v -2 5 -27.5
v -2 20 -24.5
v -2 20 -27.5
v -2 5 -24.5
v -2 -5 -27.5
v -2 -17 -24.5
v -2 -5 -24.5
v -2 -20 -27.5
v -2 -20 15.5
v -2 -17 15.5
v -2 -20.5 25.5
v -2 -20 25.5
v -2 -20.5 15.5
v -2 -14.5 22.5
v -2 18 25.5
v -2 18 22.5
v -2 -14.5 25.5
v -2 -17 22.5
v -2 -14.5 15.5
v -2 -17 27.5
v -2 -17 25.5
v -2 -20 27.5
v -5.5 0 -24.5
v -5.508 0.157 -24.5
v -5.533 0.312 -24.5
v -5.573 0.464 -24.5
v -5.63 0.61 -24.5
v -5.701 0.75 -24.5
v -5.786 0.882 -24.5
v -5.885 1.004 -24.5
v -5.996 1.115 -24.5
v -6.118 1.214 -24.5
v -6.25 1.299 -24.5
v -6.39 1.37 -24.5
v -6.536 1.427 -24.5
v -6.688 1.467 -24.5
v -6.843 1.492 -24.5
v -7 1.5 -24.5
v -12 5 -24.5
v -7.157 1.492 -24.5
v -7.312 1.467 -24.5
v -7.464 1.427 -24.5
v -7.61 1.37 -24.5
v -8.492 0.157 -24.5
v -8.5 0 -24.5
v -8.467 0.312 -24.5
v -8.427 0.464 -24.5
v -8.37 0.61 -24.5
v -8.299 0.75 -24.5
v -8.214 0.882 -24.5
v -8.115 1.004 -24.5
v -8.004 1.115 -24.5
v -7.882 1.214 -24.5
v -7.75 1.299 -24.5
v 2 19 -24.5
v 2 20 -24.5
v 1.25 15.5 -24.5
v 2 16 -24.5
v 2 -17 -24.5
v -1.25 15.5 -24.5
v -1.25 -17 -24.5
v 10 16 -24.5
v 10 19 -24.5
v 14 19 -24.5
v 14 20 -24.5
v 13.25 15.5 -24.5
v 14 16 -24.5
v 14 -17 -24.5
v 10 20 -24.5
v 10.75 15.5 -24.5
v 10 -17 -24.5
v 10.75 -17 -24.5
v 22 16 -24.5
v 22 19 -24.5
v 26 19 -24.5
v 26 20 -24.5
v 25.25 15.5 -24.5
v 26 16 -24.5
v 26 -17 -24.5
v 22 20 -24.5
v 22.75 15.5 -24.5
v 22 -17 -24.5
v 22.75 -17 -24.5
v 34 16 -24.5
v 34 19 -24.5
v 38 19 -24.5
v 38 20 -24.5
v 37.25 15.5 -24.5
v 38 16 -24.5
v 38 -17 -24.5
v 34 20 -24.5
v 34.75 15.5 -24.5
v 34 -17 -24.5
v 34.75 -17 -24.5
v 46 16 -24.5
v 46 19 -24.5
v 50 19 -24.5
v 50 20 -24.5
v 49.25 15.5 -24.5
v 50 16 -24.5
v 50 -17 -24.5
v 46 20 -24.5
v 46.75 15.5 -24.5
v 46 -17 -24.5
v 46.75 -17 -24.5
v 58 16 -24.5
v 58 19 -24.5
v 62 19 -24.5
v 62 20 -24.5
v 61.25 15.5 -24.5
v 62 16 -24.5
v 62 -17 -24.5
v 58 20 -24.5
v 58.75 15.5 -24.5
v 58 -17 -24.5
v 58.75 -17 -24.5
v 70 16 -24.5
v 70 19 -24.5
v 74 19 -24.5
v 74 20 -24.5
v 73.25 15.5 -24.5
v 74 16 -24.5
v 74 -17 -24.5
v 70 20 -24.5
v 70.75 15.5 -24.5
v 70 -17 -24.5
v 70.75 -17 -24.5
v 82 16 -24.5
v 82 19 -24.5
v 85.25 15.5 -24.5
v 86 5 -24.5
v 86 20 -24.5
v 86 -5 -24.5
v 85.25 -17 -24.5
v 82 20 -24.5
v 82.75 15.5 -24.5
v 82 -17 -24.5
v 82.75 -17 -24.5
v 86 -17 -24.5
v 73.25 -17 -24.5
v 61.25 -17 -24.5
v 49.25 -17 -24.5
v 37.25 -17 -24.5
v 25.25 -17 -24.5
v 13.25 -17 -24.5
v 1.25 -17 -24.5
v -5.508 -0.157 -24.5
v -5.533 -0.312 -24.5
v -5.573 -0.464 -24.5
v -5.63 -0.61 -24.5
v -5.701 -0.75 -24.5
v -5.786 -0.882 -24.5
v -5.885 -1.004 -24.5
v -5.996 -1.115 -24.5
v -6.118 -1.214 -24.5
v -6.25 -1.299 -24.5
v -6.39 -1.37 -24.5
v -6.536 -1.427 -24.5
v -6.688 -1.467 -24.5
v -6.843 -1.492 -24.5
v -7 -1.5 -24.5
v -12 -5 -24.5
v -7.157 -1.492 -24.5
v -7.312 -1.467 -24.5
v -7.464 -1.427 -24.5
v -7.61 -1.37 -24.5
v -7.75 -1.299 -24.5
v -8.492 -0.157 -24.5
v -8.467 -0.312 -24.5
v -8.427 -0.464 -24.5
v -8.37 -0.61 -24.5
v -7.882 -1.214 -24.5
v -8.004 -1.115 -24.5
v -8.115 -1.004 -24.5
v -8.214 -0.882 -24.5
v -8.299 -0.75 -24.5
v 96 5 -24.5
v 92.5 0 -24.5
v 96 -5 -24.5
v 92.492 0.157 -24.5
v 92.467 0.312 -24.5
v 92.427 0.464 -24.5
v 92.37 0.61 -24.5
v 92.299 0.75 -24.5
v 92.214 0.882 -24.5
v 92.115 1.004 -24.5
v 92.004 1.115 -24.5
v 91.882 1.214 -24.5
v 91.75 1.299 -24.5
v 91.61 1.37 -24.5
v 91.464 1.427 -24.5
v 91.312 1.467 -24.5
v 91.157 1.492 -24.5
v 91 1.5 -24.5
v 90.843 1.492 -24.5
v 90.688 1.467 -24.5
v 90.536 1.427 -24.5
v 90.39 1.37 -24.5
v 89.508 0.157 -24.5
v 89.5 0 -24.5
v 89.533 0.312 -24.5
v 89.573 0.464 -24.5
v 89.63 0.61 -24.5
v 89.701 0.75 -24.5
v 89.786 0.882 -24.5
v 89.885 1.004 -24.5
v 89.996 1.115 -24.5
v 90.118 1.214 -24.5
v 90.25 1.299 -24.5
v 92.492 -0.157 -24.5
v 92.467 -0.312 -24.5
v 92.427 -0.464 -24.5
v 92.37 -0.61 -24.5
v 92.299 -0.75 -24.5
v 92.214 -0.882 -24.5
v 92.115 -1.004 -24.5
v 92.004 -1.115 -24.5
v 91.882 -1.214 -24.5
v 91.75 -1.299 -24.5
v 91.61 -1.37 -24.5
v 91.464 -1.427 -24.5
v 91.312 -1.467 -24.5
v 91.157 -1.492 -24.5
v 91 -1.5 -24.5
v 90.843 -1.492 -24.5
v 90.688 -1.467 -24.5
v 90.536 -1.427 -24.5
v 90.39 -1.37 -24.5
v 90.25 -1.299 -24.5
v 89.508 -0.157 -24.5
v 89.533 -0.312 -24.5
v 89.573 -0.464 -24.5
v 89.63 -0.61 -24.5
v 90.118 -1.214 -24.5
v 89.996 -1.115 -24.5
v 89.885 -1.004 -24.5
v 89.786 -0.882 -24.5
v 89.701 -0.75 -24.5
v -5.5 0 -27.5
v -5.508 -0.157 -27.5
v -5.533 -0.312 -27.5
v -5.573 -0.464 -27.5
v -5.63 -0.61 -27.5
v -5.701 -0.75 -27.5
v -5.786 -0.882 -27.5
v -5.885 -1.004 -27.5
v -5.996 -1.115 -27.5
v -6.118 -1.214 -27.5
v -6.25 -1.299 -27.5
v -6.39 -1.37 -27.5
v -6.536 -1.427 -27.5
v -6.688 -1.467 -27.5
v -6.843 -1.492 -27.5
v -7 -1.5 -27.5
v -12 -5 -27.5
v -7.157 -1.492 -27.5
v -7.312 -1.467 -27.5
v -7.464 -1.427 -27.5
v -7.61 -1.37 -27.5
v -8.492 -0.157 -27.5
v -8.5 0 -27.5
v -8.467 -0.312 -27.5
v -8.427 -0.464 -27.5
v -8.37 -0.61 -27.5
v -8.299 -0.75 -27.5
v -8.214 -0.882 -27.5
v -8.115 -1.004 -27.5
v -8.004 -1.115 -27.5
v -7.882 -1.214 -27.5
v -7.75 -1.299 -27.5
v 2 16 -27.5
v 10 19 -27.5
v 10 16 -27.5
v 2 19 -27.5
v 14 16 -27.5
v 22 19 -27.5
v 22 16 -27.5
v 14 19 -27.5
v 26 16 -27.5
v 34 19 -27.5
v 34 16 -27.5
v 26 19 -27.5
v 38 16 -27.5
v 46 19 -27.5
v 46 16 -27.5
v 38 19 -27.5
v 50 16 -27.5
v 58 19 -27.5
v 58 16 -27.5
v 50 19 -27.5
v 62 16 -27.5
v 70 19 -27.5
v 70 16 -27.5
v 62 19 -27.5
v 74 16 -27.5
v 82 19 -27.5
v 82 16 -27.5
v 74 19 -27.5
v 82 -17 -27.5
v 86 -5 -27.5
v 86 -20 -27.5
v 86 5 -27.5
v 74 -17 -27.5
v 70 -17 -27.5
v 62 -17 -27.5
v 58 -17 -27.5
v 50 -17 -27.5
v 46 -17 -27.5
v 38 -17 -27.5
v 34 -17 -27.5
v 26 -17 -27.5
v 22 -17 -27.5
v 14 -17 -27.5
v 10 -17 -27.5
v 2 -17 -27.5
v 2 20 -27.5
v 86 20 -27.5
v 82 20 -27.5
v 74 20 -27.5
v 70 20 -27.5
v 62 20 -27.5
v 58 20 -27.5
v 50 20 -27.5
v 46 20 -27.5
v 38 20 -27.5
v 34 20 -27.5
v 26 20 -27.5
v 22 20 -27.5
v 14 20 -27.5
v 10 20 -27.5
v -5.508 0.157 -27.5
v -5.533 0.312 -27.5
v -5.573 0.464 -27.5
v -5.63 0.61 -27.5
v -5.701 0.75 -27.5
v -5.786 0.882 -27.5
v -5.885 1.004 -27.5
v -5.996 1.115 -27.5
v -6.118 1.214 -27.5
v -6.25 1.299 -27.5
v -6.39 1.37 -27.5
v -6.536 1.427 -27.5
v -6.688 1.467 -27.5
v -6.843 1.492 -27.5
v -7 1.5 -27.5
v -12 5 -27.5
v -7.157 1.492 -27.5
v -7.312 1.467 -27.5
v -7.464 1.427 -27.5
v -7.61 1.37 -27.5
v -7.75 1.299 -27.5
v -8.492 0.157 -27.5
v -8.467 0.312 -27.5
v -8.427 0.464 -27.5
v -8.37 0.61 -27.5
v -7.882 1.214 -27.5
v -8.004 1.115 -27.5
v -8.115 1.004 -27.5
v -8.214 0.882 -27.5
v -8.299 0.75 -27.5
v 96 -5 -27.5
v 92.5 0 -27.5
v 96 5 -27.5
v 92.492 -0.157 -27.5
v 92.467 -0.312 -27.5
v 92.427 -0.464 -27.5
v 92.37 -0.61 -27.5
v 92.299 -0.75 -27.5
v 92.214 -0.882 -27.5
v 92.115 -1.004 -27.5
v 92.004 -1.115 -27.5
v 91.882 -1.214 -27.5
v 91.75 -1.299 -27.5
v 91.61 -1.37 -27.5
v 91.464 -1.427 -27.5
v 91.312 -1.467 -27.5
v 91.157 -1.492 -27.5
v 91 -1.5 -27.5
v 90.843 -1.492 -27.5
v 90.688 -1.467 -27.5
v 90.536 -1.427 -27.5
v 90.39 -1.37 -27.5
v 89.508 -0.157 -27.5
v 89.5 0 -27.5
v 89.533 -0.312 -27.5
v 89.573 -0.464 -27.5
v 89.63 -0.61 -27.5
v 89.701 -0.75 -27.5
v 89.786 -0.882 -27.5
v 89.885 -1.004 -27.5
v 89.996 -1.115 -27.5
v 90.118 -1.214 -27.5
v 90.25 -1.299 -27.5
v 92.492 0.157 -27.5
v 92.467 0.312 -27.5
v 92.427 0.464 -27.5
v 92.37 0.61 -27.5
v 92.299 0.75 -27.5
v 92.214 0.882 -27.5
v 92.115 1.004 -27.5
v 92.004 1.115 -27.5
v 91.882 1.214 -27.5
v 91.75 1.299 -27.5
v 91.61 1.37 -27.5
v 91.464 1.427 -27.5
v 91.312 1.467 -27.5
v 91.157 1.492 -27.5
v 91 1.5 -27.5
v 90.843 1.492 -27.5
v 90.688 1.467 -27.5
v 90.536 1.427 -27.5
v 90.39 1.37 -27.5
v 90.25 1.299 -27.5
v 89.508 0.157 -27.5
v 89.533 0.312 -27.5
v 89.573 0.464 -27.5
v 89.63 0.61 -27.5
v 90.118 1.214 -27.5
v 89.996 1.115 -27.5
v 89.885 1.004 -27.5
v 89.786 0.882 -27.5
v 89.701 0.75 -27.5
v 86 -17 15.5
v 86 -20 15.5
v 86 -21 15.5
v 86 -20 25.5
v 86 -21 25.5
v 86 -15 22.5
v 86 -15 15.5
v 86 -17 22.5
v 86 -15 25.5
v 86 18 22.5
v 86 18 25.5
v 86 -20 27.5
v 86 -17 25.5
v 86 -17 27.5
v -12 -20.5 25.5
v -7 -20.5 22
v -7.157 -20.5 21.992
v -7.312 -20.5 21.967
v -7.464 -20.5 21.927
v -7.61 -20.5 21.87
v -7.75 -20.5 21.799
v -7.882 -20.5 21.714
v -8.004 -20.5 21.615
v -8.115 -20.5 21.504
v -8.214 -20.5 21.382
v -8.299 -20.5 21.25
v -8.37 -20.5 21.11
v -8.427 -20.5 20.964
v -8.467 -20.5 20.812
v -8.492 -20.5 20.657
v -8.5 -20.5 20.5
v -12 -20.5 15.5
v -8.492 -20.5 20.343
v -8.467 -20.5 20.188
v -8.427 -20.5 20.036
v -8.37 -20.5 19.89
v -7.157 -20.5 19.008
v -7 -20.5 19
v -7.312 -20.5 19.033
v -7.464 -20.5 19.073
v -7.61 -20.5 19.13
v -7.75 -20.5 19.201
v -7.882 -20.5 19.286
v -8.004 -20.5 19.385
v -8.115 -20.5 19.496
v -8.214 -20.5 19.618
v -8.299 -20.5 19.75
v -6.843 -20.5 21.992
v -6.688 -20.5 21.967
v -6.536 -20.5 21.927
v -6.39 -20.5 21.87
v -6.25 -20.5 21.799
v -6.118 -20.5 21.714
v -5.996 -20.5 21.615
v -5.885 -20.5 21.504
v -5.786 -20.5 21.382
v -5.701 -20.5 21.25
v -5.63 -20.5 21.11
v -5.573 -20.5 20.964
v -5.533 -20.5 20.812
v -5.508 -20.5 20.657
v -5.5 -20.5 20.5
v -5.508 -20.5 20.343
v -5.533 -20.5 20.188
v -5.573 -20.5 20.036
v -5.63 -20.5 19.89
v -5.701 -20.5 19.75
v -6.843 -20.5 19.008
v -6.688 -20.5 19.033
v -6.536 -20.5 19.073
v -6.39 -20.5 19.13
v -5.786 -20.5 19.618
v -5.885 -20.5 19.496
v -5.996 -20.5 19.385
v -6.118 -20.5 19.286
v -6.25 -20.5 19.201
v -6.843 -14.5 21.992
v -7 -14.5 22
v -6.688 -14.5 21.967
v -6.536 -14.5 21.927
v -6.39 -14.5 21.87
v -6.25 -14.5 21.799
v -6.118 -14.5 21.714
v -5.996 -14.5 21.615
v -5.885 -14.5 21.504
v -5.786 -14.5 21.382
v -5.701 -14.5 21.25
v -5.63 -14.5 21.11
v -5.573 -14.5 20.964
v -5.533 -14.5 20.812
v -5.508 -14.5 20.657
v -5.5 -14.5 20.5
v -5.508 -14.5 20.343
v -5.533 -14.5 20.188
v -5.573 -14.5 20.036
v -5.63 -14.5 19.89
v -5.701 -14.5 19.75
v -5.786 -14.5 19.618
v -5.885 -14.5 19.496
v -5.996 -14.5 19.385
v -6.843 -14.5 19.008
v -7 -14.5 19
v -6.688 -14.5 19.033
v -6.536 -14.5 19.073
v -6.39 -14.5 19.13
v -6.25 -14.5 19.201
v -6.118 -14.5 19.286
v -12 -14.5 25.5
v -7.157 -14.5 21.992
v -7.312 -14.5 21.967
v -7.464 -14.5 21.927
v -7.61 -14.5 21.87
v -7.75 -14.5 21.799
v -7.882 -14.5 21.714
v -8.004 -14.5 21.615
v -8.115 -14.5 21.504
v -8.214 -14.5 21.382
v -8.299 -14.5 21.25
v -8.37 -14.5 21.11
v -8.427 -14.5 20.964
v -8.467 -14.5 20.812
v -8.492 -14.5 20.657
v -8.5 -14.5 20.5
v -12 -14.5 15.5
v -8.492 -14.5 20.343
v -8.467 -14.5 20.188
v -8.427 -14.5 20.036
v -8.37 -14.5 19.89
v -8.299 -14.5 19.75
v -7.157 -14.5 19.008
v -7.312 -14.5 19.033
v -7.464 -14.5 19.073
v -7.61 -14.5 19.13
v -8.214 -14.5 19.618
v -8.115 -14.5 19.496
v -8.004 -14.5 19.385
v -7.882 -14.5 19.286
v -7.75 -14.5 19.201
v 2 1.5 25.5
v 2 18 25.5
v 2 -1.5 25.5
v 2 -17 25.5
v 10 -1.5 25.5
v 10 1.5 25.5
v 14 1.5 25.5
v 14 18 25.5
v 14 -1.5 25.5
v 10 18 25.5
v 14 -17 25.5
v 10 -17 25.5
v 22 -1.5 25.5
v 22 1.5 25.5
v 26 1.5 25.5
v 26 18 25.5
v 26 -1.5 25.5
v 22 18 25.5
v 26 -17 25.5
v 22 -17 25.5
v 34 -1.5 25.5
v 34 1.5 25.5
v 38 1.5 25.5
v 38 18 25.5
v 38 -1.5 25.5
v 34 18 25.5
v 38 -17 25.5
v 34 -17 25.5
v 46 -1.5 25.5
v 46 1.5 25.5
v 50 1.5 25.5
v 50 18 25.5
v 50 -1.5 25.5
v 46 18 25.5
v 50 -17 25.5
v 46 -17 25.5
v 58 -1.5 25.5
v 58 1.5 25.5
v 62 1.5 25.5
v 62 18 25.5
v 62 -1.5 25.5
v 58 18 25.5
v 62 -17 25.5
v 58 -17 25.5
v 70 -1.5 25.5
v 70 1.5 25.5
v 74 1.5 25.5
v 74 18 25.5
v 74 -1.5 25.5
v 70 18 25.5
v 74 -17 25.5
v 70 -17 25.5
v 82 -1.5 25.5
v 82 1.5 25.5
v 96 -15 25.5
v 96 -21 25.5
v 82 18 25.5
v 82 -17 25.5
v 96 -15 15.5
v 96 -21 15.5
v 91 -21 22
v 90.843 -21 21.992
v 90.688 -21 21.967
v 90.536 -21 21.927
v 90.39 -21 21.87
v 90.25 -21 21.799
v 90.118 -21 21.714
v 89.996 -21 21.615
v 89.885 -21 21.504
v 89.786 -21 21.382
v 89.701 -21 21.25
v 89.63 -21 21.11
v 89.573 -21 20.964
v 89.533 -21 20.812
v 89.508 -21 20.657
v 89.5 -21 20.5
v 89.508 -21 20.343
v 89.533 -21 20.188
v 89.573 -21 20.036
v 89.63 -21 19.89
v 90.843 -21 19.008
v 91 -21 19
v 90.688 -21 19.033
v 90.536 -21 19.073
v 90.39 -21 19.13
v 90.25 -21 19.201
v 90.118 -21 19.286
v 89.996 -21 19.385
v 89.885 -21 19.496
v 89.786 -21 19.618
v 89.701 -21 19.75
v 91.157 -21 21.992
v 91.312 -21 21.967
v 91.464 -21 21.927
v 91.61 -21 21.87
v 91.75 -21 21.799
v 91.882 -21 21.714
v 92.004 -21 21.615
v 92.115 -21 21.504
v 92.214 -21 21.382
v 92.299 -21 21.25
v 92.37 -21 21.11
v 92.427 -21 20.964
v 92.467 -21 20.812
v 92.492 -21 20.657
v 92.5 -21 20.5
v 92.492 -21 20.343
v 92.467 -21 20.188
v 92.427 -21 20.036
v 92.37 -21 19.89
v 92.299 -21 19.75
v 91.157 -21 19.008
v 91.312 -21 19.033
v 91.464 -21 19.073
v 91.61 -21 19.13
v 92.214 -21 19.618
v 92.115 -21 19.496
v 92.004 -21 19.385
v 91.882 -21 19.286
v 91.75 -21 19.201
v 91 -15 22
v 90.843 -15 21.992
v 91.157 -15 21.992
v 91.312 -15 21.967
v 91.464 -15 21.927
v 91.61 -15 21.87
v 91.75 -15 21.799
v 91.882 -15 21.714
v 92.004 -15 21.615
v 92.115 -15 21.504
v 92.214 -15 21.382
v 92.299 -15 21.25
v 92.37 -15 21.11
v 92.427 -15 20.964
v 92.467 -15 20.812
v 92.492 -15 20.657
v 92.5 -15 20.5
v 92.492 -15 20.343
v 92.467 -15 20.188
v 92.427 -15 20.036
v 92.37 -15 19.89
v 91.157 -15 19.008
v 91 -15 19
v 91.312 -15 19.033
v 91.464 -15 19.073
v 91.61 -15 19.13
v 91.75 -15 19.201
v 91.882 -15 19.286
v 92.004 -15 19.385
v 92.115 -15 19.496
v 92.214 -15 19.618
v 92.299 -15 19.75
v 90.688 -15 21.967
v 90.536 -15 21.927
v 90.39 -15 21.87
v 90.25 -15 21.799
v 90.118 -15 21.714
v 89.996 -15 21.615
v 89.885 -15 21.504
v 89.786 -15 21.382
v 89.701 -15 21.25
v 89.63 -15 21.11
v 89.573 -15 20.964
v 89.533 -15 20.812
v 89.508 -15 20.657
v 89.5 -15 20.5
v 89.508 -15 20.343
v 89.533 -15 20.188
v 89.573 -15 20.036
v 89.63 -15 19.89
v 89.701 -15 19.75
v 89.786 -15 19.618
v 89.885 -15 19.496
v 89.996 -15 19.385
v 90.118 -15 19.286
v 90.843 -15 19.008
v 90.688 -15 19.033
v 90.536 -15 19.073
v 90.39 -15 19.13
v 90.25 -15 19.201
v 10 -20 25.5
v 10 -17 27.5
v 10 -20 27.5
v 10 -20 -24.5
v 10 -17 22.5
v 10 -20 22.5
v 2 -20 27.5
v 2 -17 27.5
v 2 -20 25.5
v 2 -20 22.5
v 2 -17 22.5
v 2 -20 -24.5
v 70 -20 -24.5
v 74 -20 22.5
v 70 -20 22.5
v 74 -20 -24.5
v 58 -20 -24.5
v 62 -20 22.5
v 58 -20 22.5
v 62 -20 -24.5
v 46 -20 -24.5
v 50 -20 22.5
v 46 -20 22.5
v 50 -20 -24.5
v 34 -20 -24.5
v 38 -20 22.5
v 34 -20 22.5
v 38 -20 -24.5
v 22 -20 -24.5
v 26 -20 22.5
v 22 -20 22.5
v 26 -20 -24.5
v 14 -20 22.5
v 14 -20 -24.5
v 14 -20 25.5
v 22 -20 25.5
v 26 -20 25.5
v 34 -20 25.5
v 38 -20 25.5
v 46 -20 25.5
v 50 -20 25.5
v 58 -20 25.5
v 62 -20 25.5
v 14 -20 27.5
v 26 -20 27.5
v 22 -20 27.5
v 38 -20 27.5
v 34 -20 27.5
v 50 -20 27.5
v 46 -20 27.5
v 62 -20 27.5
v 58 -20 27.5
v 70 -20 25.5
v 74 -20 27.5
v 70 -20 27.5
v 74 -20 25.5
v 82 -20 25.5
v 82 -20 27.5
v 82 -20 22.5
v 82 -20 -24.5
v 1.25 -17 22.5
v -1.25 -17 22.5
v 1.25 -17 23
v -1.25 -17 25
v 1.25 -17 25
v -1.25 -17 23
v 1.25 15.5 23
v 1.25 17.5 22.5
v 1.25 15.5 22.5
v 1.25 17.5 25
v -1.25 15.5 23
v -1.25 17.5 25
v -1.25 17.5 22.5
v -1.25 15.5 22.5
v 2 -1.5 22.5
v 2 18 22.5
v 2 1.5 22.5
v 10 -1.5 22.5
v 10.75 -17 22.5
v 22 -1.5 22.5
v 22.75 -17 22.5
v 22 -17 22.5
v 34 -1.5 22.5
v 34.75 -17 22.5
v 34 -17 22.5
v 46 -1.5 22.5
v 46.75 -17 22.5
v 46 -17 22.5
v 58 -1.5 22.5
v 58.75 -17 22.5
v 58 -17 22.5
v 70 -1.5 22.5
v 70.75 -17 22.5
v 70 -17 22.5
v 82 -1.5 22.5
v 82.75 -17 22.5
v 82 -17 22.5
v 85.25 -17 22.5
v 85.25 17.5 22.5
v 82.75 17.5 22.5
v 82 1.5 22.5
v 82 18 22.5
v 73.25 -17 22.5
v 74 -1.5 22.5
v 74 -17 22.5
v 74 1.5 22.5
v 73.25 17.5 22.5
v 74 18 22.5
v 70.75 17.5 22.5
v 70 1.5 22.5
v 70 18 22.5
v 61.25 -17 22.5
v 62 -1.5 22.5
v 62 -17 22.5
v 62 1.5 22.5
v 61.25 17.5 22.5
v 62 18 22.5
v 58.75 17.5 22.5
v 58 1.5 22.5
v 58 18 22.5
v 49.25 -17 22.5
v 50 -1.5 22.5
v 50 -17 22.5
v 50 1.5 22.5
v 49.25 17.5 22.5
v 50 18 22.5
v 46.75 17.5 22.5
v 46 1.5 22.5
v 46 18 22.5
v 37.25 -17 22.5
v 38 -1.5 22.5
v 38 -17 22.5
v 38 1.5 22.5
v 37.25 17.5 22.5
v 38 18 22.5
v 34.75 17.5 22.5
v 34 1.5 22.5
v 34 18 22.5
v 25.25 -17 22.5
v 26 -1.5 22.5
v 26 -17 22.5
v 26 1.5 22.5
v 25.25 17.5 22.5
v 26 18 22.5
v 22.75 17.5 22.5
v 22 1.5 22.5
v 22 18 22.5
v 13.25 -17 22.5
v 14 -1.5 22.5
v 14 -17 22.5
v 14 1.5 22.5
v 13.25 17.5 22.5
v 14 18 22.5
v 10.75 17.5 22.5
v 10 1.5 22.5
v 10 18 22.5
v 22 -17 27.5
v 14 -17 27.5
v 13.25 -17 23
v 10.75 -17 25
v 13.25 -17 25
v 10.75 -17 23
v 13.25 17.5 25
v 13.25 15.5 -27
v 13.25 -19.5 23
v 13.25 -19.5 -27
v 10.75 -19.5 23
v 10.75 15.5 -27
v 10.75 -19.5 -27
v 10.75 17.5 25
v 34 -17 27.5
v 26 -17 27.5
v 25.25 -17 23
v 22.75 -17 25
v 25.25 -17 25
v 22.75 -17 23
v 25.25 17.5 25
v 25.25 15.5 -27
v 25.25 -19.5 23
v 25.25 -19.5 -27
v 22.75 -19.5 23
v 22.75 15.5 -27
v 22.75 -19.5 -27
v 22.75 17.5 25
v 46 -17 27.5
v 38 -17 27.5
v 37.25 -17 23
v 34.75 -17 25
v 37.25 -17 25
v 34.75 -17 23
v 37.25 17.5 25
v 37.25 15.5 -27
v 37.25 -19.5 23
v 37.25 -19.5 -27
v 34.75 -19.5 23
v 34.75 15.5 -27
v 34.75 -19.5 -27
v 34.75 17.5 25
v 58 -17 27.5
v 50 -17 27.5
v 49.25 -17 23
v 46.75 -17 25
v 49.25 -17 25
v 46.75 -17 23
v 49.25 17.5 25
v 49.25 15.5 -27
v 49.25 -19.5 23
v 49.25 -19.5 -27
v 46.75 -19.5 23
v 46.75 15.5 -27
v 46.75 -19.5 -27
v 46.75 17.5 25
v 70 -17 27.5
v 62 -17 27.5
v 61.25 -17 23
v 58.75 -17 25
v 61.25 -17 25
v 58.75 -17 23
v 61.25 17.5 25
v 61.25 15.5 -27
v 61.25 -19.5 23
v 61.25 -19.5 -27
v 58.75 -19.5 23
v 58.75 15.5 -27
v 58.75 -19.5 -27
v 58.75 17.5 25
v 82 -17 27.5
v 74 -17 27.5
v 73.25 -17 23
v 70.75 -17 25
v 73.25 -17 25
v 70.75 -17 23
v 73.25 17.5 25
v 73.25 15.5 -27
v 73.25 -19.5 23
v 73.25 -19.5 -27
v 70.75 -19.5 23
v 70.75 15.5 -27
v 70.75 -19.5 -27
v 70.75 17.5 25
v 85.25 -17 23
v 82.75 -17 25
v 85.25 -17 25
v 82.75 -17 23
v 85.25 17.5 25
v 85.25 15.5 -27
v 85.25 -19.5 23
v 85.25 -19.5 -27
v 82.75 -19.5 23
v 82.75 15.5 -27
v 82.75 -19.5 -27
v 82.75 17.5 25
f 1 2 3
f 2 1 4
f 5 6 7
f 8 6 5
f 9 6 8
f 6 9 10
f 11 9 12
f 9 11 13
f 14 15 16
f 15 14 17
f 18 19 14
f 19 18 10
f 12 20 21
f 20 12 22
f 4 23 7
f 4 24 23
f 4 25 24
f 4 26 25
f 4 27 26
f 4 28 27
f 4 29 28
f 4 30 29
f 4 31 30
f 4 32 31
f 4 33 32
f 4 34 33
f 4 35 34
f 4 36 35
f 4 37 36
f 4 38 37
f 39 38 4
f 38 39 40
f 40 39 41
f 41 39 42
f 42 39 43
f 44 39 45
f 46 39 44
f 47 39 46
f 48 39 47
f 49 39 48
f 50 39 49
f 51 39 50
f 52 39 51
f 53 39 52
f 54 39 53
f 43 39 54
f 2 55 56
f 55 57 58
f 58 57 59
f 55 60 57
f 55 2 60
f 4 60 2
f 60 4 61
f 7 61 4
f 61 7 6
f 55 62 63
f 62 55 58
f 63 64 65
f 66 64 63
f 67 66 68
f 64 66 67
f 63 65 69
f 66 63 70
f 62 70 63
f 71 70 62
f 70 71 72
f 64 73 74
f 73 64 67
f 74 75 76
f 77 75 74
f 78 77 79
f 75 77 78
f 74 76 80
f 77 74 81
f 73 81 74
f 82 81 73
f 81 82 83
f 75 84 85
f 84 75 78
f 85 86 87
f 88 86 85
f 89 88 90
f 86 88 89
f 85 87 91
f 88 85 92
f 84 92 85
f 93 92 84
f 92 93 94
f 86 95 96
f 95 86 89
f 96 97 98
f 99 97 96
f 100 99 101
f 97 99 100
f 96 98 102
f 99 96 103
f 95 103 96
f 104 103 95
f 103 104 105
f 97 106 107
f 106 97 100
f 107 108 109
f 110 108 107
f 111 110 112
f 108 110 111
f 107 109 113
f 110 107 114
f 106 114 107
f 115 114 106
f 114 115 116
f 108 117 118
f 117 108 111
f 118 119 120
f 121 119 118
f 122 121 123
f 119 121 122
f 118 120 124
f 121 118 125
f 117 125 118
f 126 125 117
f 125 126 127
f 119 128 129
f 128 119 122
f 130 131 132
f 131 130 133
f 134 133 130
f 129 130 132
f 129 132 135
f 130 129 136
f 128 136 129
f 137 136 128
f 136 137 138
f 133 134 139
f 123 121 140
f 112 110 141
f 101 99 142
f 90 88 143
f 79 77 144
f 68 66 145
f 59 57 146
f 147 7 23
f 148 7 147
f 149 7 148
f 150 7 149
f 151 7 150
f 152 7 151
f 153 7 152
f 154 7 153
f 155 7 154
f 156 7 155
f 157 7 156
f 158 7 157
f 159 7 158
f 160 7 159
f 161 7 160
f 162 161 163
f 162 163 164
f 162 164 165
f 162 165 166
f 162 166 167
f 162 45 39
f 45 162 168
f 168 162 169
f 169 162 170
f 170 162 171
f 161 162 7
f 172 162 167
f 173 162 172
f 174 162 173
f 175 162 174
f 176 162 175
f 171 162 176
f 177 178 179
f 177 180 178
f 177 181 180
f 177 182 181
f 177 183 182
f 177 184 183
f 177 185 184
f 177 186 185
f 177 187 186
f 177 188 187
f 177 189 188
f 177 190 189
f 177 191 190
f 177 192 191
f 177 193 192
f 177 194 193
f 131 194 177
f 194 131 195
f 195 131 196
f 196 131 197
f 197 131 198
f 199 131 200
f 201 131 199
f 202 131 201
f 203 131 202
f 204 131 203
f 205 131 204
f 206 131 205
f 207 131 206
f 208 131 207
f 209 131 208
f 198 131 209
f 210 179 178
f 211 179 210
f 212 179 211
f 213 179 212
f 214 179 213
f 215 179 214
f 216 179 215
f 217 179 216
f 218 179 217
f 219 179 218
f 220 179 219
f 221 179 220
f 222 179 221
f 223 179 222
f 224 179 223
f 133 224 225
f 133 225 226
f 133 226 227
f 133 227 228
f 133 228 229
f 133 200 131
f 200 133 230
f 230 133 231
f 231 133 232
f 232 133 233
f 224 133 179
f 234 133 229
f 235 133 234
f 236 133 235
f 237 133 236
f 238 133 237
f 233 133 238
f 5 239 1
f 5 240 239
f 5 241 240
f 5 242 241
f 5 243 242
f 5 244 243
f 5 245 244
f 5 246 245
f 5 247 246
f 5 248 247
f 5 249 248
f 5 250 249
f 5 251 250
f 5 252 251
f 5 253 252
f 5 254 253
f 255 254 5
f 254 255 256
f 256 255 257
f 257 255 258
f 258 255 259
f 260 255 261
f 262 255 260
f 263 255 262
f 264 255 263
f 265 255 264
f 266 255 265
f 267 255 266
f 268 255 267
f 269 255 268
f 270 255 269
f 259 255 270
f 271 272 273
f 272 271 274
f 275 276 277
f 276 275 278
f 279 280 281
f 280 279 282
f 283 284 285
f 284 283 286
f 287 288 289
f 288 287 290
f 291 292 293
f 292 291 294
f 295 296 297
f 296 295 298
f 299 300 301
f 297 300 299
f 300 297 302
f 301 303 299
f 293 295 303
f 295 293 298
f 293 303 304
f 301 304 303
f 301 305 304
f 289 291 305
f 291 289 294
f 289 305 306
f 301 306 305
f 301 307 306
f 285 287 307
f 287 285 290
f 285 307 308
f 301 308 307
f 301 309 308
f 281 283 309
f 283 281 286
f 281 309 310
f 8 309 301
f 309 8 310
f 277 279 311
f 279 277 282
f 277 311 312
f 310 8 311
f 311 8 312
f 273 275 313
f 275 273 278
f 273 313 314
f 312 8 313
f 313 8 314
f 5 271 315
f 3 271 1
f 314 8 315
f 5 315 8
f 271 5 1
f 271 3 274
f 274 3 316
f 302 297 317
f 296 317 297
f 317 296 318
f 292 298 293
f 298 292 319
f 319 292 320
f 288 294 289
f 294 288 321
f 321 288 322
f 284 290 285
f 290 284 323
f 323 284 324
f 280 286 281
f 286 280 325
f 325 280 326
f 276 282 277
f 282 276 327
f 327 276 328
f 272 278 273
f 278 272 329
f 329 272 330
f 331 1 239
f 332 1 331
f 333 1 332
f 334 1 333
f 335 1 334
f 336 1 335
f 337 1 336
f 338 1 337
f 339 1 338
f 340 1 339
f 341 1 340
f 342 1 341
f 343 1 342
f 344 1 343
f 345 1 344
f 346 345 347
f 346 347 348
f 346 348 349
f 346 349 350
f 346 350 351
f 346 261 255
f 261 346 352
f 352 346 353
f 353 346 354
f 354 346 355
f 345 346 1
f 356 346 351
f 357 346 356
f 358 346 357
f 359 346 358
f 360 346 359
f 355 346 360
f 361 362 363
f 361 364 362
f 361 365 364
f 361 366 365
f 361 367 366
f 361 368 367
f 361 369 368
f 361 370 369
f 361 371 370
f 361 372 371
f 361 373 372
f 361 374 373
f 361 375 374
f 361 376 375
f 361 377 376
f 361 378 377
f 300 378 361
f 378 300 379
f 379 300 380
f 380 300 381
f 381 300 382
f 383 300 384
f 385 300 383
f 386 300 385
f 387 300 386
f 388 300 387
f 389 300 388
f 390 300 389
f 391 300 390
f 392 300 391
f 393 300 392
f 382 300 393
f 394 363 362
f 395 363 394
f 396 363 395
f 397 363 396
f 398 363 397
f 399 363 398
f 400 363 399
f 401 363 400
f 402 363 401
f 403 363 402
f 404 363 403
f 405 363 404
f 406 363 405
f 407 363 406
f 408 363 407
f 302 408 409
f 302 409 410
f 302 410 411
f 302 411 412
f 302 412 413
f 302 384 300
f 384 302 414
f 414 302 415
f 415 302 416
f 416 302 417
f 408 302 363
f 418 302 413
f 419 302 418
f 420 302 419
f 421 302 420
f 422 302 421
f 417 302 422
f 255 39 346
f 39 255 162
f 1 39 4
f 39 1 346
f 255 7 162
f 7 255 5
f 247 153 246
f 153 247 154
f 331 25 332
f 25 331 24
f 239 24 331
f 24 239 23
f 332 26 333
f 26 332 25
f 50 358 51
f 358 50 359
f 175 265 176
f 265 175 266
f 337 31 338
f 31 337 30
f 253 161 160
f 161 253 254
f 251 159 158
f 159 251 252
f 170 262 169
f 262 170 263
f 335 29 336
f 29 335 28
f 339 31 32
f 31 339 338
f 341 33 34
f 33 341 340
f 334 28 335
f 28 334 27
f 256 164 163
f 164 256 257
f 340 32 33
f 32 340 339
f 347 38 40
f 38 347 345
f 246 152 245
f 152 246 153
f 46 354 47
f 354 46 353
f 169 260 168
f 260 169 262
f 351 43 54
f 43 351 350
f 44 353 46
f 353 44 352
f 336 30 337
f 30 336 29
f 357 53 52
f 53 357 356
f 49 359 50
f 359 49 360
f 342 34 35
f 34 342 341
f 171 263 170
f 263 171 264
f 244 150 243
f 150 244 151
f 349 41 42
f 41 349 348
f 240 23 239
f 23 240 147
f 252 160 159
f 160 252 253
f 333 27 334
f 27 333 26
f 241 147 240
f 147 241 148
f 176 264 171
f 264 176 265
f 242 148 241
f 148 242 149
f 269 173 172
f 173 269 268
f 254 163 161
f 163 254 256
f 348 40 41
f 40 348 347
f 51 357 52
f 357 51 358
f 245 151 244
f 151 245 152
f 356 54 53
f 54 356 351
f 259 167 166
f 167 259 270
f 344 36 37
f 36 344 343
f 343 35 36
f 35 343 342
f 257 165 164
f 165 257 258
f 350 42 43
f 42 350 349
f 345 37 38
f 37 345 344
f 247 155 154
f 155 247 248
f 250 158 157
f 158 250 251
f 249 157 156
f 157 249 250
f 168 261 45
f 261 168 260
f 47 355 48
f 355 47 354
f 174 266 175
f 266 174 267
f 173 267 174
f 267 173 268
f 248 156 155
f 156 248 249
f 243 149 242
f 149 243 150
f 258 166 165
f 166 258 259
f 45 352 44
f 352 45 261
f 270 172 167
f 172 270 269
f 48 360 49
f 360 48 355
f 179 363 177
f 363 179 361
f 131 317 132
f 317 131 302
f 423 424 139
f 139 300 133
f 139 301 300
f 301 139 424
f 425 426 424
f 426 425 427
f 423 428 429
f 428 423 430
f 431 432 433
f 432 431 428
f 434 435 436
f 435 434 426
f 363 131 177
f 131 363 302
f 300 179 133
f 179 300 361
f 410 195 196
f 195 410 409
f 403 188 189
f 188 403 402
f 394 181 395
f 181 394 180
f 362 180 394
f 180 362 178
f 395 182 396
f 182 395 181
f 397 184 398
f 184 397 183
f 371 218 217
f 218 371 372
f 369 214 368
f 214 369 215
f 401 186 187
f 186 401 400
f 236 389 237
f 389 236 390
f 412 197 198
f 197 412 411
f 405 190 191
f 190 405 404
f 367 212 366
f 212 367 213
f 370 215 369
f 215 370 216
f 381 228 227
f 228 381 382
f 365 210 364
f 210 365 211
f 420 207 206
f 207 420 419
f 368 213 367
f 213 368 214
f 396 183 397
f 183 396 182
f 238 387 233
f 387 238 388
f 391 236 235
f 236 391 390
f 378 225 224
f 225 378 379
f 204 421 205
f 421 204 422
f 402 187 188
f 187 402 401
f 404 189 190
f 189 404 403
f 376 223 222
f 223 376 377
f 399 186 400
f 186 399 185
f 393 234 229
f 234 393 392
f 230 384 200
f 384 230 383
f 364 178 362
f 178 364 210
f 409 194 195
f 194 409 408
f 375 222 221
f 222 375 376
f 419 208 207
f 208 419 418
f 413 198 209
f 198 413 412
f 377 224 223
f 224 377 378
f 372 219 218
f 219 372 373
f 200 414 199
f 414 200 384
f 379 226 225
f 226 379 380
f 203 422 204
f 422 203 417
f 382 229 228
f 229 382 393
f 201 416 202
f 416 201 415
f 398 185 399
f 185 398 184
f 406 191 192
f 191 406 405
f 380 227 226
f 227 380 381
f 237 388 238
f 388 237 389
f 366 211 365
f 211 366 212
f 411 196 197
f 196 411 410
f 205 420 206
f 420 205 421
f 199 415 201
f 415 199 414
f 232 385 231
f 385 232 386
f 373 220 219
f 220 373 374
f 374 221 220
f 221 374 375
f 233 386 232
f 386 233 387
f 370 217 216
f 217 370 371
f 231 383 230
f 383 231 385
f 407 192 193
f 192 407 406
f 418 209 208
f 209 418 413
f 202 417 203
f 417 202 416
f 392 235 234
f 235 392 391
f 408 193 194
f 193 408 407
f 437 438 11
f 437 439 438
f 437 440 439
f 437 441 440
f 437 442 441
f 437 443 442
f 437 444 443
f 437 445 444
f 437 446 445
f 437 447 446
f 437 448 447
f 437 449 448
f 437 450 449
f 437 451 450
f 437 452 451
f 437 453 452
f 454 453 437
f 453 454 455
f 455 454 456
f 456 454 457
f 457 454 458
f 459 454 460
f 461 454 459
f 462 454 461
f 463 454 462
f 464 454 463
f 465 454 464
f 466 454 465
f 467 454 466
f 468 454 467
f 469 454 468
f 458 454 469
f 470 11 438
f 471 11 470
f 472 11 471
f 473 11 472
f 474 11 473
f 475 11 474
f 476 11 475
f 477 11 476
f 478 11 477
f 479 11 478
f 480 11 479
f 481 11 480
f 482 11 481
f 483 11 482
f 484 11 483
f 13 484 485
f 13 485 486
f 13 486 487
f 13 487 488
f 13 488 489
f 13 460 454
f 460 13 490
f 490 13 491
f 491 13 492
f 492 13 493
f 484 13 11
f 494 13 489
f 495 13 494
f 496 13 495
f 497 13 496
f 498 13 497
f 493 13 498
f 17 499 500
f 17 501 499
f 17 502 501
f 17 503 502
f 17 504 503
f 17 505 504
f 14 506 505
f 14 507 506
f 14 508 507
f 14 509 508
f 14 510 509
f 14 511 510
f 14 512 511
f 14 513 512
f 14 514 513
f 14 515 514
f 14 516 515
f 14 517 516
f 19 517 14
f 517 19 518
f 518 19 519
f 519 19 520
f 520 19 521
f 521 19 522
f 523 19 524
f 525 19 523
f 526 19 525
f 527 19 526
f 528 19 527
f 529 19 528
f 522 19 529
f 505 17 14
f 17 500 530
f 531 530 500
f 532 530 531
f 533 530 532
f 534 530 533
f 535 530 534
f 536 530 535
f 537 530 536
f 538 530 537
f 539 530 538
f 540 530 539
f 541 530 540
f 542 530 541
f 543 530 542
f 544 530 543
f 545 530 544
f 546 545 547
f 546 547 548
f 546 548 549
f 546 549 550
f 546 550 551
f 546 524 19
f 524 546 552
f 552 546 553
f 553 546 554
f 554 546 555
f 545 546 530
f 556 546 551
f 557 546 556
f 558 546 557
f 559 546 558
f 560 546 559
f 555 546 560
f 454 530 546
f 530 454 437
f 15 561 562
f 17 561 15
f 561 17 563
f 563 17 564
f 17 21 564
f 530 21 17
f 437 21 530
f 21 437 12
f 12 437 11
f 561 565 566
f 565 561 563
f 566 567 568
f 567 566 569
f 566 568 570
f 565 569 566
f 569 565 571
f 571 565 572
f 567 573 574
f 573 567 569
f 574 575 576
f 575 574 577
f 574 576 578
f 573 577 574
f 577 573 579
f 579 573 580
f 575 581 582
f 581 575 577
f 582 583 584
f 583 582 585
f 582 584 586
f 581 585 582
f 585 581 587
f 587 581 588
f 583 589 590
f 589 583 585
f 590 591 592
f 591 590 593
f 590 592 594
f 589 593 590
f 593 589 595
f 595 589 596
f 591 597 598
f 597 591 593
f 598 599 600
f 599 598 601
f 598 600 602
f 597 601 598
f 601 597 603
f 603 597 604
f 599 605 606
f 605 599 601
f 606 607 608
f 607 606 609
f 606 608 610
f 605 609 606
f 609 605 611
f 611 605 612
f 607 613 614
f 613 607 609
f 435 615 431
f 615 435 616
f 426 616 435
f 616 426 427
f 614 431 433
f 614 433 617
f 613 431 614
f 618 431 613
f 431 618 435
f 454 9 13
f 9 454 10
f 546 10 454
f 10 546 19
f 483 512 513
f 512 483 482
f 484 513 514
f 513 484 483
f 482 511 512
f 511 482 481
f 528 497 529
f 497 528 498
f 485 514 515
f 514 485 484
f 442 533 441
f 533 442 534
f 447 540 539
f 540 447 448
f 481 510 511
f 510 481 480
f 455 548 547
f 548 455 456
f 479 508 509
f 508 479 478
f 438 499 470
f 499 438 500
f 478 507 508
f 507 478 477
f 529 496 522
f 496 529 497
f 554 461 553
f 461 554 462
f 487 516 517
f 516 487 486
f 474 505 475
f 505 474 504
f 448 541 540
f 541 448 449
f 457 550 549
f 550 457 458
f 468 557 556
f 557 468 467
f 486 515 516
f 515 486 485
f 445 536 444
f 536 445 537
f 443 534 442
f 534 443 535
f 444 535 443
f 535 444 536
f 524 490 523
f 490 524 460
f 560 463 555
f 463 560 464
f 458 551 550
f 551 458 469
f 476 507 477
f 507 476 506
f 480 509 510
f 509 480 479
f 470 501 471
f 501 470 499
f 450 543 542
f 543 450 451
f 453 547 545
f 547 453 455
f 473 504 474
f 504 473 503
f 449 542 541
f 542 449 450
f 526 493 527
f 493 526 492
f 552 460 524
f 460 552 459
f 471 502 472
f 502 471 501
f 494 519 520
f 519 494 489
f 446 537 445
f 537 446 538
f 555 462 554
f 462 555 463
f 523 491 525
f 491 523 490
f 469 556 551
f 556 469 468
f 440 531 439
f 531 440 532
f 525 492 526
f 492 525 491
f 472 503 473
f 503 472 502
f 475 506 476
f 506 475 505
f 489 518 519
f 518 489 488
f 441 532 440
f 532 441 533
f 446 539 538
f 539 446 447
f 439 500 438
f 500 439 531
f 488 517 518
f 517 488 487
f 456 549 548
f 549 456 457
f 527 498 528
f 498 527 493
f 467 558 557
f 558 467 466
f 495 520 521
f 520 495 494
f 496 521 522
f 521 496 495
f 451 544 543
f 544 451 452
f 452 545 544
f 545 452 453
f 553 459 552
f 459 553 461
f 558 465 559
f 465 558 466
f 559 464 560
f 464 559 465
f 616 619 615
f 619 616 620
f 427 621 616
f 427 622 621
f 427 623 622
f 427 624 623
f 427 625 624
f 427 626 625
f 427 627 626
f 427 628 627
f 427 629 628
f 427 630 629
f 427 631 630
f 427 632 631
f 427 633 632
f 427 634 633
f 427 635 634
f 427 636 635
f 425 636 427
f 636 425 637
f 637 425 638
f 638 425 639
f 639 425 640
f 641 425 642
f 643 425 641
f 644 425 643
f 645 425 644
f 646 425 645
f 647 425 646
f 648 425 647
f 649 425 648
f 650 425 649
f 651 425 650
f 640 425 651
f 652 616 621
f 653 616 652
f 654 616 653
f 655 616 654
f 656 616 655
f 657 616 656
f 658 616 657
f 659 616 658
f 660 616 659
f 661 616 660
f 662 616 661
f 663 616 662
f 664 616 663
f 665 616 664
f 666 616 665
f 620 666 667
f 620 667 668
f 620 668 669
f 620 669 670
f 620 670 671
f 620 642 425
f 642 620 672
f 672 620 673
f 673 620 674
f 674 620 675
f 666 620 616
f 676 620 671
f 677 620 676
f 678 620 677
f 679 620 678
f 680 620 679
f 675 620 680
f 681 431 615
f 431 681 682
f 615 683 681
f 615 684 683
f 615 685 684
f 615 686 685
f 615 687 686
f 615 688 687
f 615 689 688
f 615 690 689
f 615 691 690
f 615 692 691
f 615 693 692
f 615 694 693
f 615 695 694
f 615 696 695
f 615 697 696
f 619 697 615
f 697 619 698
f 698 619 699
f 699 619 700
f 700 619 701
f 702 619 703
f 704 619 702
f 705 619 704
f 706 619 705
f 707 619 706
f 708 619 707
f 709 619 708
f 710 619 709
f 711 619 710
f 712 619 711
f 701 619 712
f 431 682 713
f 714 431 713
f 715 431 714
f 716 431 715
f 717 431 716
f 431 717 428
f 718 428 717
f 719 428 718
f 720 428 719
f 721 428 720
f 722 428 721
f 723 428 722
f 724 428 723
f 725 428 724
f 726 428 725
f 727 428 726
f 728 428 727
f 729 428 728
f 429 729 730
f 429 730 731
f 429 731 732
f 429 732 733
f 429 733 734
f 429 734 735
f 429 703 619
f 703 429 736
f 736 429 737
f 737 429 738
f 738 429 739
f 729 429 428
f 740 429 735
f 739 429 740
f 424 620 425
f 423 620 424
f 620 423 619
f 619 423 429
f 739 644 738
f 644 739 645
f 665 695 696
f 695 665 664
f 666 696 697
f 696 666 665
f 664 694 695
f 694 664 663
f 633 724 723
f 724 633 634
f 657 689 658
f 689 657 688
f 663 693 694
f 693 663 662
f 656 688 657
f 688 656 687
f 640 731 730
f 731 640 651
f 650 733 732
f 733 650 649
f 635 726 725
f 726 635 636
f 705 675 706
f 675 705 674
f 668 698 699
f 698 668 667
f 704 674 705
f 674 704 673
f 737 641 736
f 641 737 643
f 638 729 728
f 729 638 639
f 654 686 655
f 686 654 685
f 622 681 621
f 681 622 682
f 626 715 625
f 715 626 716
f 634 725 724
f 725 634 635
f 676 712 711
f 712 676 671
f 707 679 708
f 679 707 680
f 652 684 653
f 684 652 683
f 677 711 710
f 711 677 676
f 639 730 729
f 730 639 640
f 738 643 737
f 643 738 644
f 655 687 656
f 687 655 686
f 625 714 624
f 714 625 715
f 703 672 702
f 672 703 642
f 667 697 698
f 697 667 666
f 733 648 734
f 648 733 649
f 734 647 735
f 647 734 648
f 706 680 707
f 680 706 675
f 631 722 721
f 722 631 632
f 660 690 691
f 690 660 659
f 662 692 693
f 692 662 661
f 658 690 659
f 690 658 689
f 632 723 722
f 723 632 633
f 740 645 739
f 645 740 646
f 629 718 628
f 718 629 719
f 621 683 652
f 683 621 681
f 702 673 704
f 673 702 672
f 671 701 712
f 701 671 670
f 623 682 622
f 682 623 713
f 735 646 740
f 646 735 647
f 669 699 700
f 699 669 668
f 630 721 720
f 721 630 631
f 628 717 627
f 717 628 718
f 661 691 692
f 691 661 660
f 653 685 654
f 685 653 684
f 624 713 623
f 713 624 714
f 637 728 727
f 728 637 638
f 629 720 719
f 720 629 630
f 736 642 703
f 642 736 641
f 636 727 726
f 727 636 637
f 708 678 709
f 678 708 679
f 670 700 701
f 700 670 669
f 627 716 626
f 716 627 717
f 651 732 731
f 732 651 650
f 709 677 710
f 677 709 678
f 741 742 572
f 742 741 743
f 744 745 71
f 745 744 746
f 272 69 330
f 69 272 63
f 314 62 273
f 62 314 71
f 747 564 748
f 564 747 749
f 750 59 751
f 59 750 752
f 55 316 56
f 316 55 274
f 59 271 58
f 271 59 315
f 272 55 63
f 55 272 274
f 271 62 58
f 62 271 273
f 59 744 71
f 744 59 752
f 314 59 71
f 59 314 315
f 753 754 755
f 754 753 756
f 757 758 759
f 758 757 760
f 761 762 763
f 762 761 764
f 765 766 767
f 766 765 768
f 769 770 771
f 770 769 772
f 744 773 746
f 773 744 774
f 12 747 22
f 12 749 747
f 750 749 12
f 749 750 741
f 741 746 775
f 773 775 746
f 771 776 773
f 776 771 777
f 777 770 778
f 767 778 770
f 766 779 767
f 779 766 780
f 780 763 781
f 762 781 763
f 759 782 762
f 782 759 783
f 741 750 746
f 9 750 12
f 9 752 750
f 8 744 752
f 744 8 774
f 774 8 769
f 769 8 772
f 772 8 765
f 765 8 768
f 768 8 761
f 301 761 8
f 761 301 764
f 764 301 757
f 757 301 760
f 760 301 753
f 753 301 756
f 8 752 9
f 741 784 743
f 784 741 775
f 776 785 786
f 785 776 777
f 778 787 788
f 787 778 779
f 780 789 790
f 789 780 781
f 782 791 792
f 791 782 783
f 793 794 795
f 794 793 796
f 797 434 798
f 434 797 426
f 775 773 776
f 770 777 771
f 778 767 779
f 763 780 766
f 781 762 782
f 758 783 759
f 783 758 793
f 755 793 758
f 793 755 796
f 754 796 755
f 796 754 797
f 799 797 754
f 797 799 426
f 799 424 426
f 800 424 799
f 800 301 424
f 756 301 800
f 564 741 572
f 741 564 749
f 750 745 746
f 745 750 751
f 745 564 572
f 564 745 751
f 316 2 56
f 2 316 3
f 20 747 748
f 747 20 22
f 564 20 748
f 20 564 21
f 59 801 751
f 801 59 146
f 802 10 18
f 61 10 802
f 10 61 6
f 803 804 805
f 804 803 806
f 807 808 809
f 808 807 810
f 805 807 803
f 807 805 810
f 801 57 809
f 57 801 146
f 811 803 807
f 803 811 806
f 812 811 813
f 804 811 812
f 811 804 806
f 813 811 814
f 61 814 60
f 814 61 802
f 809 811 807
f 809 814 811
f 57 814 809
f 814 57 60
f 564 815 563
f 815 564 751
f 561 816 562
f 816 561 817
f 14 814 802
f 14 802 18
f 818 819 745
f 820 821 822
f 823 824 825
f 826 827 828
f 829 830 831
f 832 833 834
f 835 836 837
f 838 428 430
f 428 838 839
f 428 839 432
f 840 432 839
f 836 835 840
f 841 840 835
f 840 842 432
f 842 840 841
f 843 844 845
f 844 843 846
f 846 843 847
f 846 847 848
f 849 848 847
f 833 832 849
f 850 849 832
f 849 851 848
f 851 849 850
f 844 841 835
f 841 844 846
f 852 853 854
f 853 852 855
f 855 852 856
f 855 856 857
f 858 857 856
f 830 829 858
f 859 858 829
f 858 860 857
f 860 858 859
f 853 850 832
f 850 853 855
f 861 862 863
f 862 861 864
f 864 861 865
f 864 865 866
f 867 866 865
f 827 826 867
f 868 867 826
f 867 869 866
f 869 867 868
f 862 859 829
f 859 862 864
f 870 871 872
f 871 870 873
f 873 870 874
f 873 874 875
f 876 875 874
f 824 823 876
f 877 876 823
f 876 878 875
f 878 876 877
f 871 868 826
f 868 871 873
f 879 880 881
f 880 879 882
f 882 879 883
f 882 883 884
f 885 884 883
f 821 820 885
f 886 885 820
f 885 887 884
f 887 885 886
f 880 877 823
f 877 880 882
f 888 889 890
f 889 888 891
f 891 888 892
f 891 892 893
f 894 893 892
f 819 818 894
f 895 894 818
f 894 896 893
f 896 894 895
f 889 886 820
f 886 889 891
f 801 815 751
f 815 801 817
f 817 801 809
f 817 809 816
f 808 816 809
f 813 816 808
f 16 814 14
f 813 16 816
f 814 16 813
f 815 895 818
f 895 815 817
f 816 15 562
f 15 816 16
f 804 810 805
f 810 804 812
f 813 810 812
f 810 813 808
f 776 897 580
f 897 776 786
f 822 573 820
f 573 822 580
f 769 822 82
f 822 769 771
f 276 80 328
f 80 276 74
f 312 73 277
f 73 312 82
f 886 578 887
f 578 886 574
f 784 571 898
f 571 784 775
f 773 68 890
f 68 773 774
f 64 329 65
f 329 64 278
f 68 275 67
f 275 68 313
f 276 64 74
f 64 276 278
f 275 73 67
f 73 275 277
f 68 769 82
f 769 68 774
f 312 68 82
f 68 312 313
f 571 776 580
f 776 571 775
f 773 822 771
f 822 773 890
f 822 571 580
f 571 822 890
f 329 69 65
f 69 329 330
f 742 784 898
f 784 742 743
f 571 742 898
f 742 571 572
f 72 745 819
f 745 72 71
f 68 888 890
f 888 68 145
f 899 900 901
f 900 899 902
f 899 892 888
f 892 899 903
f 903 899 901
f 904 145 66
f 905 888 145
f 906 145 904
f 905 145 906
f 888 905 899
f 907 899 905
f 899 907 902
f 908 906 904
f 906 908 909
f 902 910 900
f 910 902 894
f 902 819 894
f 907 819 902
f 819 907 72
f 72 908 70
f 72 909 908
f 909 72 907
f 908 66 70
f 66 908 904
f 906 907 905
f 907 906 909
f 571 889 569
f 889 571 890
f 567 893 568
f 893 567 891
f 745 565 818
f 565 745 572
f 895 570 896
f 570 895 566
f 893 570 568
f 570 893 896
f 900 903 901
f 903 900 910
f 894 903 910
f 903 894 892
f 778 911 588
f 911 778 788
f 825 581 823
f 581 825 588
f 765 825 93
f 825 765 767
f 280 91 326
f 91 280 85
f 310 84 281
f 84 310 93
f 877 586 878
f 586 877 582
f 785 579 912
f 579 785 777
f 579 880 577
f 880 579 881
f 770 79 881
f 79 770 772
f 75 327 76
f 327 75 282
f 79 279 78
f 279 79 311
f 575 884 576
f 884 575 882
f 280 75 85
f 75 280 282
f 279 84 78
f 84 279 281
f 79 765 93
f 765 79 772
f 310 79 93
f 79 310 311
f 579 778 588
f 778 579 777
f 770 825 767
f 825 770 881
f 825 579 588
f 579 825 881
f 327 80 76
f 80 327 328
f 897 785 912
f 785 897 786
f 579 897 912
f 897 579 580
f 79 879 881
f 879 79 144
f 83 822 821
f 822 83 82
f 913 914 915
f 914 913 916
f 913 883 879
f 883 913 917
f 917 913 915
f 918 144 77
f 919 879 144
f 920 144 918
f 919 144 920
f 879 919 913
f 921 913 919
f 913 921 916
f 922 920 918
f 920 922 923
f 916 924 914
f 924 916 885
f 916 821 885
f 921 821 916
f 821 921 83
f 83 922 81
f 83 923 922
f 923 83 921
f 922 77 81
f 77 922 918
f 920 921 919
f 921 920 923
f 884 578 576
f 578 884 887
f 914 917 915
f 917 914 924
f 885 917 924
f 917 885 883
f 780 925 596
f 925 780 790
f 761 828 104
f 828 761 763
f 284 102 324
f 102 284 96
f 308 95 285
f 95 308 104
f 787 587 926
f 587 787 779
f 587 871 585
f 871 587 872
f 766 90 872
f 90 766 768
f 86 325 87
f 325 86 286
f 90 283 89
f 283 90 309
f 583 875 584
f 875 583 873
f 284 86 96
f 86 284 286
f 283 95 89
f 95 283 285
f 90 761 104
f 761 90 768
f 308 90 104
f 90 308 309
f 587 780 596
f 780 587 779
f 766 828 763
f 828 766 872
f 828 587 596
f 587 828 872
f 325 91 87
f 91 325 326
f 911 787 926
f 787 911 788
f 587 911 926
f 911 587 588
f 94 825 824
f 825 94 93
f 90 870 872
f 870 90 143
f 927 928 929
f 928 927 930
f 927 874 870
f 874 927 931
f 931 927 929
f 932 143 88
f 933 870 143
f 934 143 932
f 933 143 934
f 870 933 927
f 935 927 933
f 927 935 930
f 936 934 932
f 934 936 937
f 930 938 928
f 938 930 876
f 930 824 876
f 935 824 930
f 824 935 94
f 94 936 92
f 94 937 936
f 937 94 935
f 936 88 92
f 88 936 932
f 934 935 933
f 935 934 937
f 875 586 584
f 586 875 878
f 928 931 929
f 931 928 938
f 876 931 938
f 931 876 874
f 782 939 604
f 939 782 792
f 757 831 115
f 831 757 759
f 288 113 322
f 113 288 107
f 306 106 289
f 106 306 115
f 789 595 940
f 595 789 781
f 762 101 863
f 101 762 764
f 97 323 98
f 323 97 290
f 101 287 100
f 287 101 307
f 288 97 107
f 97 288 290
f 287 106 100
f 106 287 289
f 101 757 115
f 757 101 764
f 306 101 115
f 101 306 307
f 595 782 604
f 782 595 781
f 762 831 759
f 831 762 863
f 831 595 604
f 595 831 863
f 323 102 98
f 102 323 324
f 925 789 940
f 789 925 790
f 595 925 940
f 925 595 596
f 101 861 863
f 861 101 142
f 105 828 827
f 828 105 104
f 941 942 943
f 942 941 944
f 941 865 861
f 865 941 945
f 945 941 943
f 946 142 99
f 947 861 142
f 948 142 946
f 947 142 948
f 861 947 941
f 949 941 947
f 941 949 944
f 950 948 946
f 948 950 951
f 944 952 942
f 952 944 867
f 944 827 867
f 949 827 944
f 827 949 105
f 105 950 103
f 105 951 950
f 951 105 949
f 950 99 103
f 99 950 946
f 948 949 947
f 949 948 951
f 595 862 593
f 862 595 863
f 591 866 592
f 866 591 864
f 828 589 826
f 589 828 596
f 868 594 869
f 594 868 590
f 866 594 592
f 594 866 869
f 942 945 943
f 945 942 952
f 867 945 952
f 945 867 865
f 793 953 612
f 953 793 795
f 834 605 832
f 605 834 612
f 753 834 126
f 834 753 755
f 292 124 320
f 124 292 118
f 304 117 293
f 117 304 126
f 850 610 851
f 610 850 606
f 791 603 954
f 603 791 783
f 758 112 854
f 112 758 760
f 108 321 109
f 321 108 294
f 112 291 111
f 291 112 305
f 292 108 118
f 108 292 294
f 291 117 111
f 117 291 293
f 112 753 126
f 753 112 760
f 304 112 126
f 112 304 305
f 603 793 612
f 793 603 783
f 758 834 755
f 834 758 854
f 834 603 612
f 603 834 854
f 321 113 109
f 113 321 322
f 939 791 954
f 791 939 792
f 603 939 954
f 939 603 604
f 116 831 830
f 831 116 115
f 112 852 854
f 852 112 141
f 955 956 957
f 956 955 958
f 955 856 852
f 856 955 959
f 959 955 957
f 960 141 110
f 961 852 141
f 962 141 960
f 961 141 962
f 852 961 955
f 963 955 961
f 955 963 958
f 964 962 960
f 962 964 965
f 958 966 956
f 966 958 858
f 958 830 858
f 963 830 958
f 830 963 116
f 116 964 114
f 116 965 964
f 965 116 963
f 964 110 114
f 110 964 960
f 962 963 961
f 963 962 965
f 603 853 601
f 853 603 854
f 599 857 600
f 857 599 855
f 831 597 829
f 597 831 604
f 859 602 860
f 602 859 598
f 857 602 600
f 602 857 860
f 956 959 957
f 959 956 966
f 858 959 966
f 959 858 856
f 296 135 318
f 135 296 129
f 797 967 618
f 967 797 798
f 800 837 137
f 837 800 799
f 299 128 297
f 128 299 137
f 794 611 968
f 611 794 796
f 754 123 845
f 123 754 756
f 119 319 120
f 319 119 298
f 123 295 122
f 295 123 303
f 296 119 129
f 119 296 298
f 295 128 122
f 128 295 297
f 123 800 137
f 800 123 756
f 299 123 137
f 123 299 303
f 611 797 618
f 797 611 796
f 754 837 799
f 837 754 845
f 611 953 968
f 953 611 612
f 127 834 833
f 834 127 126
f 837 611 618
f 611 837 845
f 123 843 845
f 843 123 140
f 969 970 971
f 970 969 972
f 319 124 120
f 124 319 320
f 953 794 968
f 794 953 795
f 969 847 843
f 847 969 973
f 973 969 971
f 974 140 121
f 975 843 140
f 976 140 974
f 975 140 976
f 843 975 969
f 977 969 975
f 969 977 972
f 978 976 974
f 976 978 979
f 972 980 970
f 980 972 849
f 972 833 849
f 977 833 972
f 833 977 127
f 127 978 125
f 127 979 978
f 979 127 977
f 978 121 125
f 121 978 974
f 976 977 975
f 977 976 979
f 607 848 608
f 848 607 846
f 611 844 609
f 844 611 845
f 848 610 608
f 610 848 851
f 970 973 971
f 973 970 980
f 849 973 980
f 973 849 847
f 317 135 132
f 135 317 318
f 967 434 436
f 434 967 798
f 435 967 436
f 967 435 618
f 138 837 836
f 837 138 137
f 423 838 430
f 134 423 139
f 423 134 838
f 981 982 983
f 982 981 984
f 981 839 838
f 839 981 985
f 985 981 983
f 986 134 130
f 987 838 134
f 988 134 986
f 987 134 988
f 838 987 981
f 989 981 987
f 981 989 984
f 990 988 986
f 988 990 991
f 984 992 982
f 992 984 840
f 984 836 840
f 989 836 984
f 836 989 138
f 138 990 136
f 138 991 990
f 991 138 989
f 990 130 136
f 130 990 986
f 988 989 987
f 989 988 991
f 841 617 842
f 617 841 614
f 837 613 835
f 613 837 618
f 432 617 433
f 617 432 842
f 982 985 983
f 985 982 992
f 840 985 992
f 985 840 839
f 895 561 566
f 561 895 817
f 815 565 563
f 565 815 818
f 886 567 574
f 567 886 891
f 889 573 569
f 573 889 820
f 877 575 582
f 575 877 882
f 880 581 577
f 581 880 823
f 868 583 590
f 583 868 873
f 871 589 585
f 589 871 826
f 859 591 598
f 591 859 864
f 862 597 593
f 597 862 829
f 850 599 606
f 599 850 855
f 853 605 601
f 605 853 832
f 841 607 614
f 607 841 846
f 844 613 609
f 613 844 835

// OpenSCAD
// Platineneinschub

platine = true;
halterung = true;
steg_unten = true;
steg_oben = true;
befestigung_unten = true;
befestigung_oben = true;
huelle = true;

anzahl = 8;
abstand = 12;

halterbreite = 4;
platinendicke = 2.5;

px = 35;
py = 50;

if (platine) platine(0);
if (befestigung_unten) befestigung_unten();
if (befestigung_oben) befestigung_oben();

if (anzahl > 0) {
    i=0;
    for ( i = [0:1:anzahl-1] ) {
        if (steg_unten && i+1 < anzahl) steg_unten(i);
        if (halterung) halterung(i);
        if (steg_oben && i+1 < anzahl) steg_oben(i);
        if (huelle) huelle(i);
    }
}


module platine(i) {
    color("Goldenrod",0.40)
    translate([abstand*i,-2,-2])
    cube([platinendicke,px,py],center=true);
}

module halterung(i) {
    difference() {
        halter(i);
        platine(i);
    }
}


module halter(i) {
    
    color("lightblue")
    translate([abstand*i,0,-py/2-1])
    cube([halterbreite,px+5,3], center=true);
    color("lightblue")
    translate([abstand*i,-px/2-1,0])
    cube([halterbreite,3,py+5], center=true);
}

module steg_unten(i) {
    
    translate([abstand/2+i*abstand,px/2,-py/2-1])
    cube([abstand-halterbreite,3,3],center=true);
    translate([abstand/2+i*abstand,-px/2-1,-py/2-1])
    cube([abstand-halterbreite,3,3],center=true);
    translate([abstand/2+i*abstand,-px/2-1,py/2-1])
    cube([abstand-halterbreite,3,3],center=true);
}

module steg_oben(i) {
    
    translate([abstand/2+i*abstand,0,py/2-1])
    cube([abstand-halterbreite,3,3],center=true);
}

module befestigung_unten() {
    $fn=60;
    difference() {
        translate([-halterbreite*2+1,0,-py/2-1])
        cube([10,10,3], center=true);
        translate([-halterbreite*2+1,0,-py/2-1])
        cylinder(d=3,h=6, center=true);
    }
        
    difference() {       
        translate([halterbreite*2-1+abstand*(anzahl-1),0,-py/2-1])
        cube([10,10,3], center=true);
        translate([halterbreite*2-1+abstand*(anzahl-1),0,-py/2-1])
        cylinder(d=3,h=6, center=true);
    }
        
}

module befestigung_oben() {
    $fn=60;
    rotate([90,0,0])
    difference() {
        translate([-7,py/2-4.5,px/2])
        cube([10,10,6], center=true);
        translate([-7,py/2-4.5,px/2])
        cylinder(d=3,h=10, center=true);
    }
        
    rotate([90,0,0])
    difference() {       
        translate([halterbreite*2-1+abstand*(anzahl-1),px/2+3,py/2-7])
        cube([10,10,6], center=true);
        translate([halterbreite*2-1+abstand*(anzahl-1),px/2+3,py/2-7])
        cylinder(d=3,h=10, center=true);
    }
        
}

module huelle(i) {
    difference() {
        huell(i);
        translate([0,2,2])
        platine(i);
    }
}

module huell(i) {
    color("lightgreen")
    translate([abstand*i,0.5,py/2-1])
    cube([halterbreite,px,3], center=true);
   
}
